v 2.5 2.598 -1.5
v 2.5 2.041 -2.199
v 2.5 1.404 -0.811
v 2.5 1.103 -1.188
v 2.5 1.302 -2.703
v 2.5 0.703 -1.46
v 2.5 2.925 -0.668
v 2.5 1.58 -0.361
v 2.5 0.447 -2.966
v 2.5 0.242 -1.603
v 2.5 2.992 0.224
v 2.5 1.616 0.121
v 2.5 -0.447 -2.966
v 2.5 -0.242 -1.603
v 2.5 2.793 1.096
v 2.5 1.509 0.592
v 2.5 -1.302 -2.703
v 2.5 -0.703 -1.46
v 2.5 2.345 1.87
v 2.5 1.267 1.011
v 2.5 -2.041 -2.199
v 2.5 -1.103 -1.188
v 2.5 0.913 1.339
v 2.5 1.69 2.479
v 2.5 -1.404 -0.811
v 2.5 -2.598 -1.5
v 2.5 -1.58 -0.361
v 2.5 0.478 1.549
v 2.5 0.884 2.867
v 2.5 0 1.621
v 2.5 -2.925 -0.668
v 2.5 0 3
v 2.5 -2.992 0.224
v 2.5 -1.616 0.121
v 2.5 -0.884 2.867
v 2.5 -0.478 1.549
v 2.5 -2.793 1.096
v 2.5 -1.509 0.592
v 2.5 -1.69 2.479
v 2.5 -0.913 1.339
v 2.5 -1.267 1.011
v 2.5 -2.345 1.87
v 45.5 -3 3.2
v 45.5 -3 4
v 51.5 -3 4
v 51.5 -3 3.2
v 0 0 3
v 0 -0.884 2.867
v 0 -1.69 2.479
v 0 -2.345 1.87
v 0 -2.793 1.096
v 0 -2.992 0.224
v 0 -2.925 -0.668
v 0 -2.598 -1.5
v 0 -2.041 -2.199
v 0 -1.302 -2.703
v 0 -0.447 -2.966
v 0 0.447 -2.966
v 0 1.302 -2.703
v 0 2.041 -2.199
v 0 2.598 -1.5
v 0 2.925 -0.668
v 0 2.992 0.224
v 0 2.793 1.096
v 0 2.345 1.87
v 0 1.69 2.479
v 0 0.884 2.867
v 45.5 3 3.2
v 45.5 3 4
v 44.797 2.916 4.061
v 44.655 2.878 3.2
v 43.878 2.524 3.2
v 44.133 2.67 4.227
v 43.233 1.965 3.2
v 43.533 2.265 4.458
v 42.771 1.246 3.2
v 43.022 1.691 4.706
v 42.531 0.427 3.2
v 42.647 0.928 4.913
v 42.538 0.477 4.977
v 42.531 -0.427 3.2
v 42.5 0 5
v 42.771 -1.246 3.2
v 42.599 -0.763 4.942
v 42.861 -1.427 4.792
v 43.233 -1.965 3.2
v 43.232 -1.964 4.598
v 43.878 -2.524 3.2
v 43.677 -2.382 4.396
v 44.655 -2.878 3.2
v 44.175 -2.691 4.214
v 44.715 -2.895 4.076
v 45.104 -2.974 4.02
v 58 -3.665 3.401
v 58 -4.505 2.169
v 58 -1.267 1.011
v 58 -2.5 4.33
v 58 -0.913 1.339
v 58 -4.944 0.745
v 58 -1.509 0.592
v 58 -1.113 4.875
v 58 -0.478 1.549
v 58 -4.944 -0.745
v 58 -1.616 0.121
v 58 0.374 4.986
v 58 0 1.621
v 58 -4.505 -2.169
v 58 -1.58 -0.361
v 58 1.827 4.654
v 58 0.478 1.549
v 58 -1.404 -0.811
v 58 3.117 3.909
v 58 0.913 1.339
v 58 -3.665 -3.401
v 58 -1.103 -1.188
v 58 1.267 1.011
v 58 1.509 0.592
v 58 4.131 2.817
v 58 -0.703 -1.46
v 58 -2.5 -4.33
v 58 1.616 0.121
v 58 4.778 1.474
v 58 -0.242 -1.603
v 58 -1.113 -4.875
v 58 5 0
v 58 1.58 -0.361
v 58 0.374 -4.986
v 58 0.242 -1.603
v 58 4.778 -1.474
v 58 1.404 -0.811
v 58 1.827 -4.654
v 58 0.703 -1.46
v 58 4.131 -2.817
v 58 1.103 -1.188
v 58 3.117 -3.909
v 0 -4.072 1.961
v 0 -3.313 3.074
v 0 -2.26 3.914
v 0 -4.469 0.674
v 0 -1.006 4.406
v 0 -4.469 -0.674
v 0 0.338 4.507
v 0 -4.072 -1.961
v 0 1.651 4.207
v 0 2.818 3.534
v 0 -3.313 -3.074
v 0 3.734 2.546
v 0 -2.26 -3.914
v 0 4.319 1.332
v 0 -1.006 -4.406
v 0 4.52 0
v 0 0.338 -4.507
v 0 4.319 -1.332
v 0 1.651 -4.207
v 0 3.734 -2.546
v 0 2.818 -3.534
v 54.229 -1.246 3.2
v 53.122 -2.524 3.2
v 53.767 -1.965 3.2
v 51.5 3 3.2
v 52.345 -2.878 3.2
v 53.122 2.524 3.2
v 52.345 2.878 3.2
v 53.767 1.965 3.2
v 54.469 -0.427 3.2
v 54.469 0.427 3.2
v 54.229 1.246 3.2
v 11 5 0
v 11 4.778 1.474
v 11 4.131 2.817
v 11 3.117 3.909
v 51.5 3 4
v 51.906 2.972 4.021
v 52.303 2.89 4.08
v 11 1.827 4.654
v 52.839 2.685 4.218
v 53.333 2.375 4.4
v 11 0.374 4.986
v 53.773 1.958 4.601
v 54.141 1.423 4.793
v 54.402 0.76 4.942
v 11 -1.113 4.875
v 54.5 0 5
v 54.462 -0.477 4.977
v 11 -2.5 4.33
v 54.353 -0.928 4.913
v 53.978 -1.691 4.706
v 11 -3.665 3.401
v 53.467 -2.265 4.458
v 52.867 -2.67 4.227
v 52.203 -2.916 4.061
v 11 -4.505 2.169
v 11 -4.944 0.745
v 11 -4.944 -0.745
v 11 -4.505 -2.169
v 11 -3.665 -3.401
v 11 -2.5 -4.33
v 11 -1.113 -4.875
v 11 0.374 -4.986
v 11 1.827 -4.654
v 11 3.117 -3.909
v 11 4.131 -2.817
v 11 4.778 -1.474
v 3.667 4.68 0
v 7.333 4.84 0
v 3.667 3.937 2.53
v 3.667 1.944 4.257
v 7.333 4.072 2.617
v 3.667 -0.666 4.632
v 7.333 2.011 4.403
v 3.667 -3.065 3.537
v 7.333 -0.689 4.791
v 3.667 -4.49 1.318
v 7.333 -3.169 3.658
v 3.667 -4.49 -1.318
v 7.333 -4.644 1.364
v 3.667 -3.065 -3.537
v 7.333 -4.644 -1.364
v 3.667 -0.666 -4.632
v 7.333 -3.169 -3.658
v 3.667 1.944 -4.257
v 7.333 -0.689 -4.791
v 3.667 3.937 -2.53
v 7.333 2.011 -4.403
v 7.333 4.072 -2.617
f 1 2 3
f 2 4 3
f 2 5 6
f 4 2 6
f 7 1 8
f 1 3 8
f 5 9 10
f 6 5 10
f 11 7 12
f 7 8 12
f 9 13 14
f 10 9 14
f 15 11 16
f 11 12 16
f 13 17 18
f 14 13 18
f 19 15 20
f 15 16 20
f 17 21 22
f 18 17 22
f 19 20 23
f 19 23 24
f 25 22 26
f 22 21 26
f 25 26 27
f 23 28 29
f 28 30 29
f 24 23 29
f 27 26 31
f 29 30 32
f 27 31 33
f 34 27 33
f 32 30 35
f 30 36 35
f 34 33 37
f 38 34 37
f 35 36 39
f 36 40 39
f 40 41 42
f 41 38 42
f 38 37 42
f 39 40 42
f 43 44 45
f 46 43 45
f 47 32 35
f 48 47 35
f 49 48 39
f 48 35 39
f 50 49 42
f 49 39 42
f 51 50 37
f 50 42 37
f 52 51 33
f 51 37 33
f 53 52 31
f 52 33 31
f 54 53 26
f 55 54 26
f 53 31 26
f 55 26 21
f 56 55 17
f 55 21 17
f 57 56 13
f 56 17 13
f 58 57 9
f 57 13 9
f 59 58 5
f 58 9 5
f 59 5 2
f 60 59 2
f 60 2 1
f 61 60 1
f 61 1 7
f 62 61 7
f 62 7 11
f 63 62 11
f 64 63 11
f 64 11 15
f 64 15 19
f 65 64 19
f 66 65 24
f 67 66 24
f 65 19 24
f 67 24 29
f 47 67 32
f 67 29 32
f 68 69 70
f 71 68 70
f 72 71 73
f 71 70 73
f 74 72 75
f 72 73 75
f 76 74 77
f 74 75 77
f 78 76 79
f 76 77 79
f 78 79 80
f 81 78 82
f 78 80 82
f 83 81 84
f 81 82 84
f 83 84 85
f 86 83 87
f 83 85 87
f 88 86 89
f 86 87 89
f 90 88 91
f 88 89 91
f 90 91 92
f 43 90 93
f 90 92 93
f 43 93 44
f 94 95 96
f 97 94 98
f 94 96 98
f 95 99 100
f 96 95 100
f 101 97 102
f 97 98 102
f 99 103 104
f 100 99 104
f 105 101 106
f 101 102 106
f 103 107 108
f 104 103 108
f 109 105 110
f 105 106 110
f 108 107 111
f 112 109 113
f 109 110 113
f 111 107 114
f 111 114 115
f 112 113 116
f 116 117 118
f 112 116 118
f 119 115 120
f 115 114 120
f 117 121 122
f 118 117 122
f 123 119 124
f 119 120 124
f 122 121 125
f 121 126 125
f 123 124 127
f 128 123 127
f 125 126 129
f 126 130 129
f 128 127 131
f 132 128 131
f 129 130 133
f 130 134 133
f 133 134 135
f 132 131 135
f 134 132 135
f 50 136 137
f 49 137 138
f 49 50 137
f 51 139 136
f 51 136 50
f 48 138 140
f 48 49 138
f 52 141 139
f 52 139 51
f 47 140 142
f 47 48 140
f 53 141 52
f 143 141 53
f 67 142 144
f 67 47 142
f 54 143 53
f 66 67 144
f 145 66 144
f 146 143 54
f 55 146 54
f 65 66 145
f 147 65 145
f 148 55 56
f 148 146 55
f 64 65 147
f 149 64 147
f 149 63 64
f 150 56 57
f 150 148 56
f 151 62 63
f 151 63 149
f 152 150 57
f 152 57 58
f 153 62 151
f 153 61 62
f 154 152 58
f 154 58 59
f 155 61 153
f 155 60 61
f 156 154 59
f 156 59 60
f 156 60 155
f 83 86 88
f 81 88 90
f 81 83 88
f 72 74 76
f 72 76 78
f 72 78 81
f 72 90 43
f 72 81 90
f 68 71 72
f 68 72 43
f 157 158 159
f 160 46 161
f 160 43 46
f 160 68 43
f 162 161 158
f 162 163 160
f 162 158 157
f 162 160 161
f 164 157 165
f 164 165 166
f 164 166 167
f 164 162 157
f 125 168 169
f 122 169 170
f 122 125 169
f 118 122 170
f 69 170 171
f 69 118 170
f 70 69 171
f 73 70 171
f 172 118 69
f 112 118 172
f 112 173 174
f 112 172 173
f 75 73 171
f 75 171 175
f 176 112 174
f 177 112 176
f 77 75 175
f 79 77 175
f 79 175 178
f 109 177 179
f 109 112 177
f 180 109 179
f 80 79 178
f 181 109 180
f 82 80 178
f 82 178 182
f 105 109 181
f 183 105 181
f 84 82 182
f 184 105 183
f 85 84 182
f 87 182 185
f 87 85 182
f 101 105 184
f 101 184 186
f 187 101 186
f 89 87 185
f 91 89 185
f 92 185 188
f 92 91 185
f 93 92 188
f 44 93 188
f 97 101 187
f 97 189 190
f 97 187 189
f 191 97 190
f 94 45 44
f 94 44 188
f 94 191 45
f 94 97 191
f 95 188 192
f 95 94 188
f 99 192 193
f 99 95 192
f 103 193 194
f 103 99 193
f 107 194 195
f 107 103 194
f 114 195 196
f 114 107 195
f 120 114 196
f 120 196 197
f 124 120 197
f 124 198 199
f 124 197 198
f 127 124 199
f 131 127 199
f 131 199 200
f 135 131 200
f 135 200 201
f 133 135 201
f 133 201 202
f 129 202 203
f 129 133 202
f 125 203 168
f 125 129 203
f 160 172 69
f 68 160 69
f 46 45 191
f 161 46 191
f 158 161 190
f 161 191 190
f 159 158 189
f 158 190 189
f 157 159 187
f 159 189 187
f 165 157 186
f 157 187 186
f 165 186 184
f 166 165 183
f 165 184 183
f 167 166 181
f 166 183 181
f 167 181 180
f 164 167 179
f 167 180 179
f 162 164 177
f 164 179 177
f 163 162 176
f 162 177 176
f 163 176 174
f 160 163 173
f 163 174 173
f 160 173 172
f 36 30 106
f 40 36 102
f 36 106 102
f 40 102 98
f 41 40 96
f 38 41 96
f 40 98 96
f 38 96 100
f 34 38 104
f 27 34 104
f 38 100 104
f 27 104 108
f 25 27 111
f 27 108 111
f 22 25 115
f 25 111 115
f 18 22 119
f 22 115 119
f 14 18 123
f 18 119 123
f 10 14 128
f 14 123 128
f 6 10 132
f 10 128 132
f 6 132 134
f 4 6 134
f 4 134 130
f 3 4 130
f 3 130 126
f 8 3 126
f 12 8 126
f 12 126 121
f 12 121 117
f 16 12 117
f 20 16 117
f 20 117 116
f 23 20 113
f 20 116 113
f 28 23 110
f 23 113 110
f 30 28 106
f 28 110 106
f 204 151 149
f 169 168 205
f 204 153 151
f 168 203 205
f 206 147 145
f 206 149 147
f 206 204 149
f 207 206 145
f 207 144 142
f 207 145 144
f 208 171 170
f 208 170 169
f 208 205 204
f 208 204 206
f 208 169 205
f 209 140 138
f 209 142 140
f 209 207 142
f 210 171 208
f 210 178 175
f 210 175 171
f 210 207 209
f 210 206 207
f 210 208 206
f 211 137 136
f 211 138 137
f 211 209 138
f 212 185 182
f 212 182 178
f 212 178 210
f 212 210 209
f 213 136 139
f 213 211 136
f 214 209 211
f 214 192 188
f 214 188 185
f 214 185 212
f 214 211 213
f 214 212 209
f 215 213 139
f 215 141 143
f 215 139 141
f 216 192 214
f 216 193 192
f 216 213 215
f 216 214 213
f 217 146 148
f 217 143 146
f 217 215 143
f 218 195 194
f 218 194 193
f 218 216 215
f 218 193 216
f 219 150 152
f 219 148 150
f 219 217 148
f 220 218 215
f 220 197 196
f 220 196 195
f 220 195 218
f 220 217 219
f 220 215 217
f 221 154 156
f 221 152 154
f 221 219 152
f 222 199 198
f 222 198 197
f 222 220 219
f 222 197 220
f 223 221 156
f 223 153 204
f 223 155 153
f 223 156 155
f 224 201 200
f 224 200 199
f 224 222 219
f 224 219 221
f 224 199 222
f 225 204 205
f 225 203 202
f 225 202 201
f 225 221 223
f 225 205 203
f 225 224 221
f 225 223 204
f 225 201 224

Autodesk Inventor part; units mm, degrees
ref_plane "YZ Plane" through (0, 0, 0) normal (1, 0, 0) x (0, 1, 0)
ref_plane "XZ Plane" through (0, 0, 0) normal (0, 1, 0) x (-1, 0, 0)
sketch "Skizze1" plane through (0, 0, 0) normal (0, 0, 1) x (1, 0, 0)
  line L0 (0, 0) -> (0, 4.5197)
  line L1 (0, 4.5197) -> (11, 5)
  line L2 (11, 5) -> (58, 5)
  line L3 (58, 5) -> (58, 0)
  line L4 (58, 0) -> (0, 0)
  dimension "d0" = 2.5
  dimension "d1" = 58
  dimension "d2" = 10
  dimension "d3" = 11
revolve "Umdrehung1" add sketch "Skizze1" angle 360 about axis through (58, 0, 0) along (-1, 0, 0)
ref_plane "Arbeitsebene1" through (0, 0, 5) normal (0, 0, 1) x (1, 0, 0)
sketch "Skizze2" plane through (0, 0, 5) normal (0, 0, 1) x (1, 0, 0)
  line L0 (58, 5) -> (58, -5) projected
  line L1 (0, 0) -> (78.1266, 0) construction
  line L2 (45.5, 0) -> (51.5, 0) construction
  line L3 (45.5, -3) -> (51.5, -3)
  line L4 (51.5, 3) -> (45.5, 3)
  arc A0 (45.5, 3) -> (45.5, -3) centre (45.5, 0) ccw
  arc A1 (51.5, -3) -> (51.5, 3) centre (51.5, 0) ccw
  point P0 (48.5, 0)
  point P1 (58, 0)
  point P2 (54.5, 0)
  point P3 (42.5, 0)
  dimension "d8" = 12
  dimension "d9" = 3.5
  dimension "d10" = 3
extrude "Extrusion1" cut sketch "Skizze2" against normal blind 1.8
sketch "Skizze3" plane through (0, 0, 0) normal (-1, 0, 0) x (0, 0, 1)
  circle A0 centre (0, 0) radius 4.5197 projected
hole "Bohrung1" at (0, 0, 0) direction (1, 0, 0) diameter 3.242 depth 58 counterbore diameter 6 counterbore depth 2.5 thread size "M4x0.7" class "6H" standard "ISO Metric profile"
properties part number "Welle" material "Aluminum 6061-AHC"
